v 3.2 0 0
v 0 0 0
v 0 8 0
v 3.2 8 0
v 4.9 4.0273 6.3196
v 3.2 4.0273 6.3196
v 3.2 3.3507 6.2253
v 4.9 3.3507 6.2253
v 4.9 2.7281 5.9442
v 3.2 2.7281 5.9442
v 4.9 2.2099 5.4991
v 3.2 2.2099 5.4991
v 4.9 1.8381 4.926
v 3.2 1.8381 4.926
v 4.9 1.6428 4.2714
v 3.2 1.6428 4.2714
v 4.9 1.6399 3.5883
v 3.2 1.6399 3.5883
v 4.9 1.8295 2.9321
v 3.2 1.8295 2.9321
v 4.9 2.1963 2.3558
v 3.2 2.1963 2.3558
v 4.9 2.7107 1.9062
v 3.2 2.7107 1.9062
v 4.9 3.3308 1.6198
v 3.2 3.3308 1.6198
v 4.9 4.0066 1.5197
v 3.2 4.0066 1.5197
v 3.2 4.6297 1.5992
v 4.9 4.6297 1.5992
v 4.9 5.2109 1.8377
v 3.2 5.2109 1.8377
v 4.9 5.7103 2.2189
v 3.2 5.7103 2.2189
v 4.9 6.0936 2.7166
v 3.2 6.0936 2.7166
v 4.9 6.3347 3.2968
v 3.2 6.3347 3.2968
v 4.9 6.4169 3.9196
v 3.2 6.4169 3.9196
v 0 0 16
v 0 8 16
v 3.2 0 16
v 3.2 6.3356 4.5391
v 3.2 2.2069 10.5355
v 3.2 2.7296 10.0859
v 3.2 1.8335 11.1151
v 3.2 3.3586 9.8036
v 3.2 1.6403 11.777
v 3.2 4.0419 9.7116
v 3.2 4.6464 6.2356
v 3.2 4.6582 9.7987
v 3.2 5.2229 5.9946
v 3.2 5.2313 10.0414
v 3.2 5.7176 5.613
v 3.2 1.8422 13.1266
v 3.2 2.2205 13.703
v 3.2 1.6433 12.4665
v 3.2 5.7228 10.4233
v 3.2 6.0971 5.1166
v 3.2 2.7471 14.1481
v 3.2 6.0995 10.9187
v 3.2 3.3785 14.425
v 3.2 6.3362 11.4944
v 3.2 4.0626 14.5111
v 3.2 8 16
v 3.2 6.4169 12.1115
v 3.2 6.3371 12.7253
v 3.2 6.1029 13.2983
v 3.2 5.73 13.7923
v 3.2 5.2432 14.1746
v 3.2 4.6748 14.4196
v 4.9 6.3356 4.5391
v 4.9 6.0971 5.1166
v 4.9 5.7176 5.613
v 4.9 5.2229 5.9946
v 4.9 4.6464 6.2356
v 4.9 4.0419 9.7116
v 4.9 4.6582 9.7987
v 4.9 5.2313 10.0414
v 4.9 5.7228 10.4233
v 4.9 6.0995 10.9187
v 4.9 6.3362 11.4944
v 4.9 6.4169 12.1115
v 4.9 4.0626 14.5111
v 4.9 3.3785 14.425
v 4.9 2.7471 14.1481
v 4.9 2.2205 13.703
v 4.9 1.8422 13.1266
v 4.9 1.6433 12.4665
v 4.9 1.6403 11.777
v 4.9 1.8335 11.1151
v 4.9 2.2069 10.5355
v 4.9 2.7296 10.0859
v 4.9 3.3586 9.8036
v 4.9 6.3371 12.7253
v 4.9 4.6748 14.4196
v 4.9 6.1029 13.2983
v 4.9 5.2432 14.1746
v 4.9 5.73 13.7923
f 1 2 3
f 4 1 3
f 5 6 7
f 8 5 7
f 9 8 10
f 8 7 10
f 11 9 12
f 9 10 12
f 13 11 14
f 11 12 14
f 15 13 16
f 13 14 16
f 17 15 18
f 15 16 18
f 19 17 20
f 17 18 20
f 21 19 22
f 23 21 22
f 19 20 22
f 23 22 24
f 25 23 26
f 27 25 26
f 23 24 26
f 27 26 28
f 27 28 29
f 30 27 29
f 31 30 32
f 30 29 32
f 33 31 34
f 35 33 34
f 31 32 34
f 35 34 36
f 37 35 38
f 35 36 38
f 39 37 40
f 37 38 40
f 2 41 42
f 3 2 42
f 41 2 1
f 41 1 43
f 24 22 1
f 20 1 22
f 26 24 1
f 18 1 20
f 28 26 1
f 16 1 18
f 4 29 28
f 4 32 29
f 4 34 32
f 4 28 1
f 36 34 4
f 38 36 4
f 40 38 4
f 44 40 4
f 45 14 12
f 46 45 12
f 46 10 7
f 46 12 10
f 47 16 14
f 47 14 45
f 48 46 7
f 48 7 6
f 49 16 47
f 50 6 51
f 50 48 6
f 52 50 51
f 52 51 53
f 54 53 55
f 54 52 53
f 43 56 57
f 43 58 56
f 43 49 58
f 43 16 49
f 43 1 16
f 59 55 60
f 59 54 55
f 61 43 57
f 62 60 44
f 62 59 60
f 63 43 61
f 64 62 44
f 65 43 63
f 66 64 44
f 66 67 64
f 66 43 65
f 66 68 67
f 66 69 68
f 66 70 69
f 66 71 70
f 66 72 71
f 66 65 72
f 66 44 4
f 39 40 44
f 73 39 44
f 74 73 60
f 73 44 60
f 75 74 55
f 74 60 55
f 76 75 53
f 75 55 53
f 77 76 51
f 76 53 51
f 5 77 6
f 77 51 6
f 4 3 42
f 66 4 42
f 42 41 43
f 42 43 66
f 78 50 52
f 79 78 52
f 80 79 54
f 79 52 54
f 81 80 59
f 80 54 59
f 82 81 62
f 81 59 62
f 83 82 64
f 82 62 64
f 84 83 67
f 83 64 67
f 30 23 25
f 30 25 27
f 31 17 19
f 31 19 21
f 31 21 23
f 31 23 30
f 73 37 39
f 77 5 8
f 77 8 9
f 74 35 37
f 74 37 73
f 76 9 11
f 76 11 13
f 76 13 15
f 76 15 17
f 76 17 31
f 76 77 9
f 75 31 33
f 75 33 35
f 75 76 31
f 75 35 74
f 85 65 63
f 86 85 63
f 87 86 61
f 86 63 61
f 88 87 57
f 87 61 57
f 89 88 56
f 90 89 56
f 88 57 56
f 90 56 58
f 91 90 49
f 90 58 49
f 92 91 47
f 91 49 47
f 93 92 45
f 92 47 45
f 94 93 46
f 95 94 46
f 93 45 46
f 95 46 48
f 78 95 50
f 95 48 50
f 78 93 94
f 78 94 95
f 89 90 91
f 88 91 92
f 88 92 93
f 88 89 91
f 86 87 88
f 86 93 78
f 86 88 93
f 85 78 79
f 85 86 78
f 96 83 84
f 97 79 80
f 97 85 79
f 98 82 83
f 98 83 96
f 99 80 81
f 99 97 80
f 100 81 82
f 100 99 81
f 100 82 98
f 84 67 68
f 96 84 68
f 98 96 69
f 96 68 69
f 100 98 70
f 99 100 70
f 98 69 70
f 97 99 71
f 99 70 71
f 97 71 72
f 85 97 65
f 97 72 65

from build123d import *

# Parameters (mm, degrees)
F0_W     = 8
F0_H     = 16
F1_DEPTH = 3.2
F3_DEPTH = 1.7


# Not quite as in the source:
# - a feature names something its author has since deleted; it is built from what else it names


with BuildPart() as f1:
    # F0 (on Right) → F1 (new body)
    with BuildSketch(Plane.YZ):
        with Locations((4, 8)):
            Rectangle(F0_W, F0_H)
    extrude(amount=F1_DEPTH)

    # F2 (on face) → F3 (join)
    with BuildSketch(Plane.YZ.offset(3.2)):
        with BuildLine():
            ThreePointArc((4.0419005416, 9.7116244191), (5.7227796266, 10.4232962474), (6.4169111453, 12.1114943177))
            ThreePointArc((6.4169111453, 12.1114943177), (5.730047367, 13.7923168204), (4.0626075738, 14.5110592441))
            Line((4.0626075738, 14.5110592441), (4.0419005416, 9.7116244191))
        make_face()
        with BuildLine():
            Line((4.0419005416, 9.7116244191), (4.0626075738, 14.5110592441))
            ThreePointArc((4.0626075738, 14.5110592441), (1.6169334826, 12.1218489566), (4.0419005416, 9.7116244191))
        make_face()
        with BuildLine():
            ThreePointArc((6.4169111453, 3.9196317084), (5.7176243976, 5.6130231083), (4.0272657842, 6.3196093711))
            Line((4.0272657842, 6.3196093711), (4.0272298946, 6.3112909609))
            Line((4.0272298946, 6.3112909609), (4.0065565064, 1.5196540457))
            ThreePointArc((4.0065565064, 1.5196540457), (5.7103025452, 2.2189184561), (6.4169111453, 3.9196317084))
        make_face()
        with BuildLine():
            Line((4.0272298946, 6.3112909609), (4.0272657842, 6.3196093711))
            ThreePointArc((4.0272657842, 6.3196093711), (1.6169334826, 3.9299863473), (4.0065565064, 1.5196540457))
            Line((4.0065565064, 1.5196540457), (4.0272298946, 6.3112909609))
        make_face()
    extrude(amount=F3_DEPTH)


solid = f1.part
